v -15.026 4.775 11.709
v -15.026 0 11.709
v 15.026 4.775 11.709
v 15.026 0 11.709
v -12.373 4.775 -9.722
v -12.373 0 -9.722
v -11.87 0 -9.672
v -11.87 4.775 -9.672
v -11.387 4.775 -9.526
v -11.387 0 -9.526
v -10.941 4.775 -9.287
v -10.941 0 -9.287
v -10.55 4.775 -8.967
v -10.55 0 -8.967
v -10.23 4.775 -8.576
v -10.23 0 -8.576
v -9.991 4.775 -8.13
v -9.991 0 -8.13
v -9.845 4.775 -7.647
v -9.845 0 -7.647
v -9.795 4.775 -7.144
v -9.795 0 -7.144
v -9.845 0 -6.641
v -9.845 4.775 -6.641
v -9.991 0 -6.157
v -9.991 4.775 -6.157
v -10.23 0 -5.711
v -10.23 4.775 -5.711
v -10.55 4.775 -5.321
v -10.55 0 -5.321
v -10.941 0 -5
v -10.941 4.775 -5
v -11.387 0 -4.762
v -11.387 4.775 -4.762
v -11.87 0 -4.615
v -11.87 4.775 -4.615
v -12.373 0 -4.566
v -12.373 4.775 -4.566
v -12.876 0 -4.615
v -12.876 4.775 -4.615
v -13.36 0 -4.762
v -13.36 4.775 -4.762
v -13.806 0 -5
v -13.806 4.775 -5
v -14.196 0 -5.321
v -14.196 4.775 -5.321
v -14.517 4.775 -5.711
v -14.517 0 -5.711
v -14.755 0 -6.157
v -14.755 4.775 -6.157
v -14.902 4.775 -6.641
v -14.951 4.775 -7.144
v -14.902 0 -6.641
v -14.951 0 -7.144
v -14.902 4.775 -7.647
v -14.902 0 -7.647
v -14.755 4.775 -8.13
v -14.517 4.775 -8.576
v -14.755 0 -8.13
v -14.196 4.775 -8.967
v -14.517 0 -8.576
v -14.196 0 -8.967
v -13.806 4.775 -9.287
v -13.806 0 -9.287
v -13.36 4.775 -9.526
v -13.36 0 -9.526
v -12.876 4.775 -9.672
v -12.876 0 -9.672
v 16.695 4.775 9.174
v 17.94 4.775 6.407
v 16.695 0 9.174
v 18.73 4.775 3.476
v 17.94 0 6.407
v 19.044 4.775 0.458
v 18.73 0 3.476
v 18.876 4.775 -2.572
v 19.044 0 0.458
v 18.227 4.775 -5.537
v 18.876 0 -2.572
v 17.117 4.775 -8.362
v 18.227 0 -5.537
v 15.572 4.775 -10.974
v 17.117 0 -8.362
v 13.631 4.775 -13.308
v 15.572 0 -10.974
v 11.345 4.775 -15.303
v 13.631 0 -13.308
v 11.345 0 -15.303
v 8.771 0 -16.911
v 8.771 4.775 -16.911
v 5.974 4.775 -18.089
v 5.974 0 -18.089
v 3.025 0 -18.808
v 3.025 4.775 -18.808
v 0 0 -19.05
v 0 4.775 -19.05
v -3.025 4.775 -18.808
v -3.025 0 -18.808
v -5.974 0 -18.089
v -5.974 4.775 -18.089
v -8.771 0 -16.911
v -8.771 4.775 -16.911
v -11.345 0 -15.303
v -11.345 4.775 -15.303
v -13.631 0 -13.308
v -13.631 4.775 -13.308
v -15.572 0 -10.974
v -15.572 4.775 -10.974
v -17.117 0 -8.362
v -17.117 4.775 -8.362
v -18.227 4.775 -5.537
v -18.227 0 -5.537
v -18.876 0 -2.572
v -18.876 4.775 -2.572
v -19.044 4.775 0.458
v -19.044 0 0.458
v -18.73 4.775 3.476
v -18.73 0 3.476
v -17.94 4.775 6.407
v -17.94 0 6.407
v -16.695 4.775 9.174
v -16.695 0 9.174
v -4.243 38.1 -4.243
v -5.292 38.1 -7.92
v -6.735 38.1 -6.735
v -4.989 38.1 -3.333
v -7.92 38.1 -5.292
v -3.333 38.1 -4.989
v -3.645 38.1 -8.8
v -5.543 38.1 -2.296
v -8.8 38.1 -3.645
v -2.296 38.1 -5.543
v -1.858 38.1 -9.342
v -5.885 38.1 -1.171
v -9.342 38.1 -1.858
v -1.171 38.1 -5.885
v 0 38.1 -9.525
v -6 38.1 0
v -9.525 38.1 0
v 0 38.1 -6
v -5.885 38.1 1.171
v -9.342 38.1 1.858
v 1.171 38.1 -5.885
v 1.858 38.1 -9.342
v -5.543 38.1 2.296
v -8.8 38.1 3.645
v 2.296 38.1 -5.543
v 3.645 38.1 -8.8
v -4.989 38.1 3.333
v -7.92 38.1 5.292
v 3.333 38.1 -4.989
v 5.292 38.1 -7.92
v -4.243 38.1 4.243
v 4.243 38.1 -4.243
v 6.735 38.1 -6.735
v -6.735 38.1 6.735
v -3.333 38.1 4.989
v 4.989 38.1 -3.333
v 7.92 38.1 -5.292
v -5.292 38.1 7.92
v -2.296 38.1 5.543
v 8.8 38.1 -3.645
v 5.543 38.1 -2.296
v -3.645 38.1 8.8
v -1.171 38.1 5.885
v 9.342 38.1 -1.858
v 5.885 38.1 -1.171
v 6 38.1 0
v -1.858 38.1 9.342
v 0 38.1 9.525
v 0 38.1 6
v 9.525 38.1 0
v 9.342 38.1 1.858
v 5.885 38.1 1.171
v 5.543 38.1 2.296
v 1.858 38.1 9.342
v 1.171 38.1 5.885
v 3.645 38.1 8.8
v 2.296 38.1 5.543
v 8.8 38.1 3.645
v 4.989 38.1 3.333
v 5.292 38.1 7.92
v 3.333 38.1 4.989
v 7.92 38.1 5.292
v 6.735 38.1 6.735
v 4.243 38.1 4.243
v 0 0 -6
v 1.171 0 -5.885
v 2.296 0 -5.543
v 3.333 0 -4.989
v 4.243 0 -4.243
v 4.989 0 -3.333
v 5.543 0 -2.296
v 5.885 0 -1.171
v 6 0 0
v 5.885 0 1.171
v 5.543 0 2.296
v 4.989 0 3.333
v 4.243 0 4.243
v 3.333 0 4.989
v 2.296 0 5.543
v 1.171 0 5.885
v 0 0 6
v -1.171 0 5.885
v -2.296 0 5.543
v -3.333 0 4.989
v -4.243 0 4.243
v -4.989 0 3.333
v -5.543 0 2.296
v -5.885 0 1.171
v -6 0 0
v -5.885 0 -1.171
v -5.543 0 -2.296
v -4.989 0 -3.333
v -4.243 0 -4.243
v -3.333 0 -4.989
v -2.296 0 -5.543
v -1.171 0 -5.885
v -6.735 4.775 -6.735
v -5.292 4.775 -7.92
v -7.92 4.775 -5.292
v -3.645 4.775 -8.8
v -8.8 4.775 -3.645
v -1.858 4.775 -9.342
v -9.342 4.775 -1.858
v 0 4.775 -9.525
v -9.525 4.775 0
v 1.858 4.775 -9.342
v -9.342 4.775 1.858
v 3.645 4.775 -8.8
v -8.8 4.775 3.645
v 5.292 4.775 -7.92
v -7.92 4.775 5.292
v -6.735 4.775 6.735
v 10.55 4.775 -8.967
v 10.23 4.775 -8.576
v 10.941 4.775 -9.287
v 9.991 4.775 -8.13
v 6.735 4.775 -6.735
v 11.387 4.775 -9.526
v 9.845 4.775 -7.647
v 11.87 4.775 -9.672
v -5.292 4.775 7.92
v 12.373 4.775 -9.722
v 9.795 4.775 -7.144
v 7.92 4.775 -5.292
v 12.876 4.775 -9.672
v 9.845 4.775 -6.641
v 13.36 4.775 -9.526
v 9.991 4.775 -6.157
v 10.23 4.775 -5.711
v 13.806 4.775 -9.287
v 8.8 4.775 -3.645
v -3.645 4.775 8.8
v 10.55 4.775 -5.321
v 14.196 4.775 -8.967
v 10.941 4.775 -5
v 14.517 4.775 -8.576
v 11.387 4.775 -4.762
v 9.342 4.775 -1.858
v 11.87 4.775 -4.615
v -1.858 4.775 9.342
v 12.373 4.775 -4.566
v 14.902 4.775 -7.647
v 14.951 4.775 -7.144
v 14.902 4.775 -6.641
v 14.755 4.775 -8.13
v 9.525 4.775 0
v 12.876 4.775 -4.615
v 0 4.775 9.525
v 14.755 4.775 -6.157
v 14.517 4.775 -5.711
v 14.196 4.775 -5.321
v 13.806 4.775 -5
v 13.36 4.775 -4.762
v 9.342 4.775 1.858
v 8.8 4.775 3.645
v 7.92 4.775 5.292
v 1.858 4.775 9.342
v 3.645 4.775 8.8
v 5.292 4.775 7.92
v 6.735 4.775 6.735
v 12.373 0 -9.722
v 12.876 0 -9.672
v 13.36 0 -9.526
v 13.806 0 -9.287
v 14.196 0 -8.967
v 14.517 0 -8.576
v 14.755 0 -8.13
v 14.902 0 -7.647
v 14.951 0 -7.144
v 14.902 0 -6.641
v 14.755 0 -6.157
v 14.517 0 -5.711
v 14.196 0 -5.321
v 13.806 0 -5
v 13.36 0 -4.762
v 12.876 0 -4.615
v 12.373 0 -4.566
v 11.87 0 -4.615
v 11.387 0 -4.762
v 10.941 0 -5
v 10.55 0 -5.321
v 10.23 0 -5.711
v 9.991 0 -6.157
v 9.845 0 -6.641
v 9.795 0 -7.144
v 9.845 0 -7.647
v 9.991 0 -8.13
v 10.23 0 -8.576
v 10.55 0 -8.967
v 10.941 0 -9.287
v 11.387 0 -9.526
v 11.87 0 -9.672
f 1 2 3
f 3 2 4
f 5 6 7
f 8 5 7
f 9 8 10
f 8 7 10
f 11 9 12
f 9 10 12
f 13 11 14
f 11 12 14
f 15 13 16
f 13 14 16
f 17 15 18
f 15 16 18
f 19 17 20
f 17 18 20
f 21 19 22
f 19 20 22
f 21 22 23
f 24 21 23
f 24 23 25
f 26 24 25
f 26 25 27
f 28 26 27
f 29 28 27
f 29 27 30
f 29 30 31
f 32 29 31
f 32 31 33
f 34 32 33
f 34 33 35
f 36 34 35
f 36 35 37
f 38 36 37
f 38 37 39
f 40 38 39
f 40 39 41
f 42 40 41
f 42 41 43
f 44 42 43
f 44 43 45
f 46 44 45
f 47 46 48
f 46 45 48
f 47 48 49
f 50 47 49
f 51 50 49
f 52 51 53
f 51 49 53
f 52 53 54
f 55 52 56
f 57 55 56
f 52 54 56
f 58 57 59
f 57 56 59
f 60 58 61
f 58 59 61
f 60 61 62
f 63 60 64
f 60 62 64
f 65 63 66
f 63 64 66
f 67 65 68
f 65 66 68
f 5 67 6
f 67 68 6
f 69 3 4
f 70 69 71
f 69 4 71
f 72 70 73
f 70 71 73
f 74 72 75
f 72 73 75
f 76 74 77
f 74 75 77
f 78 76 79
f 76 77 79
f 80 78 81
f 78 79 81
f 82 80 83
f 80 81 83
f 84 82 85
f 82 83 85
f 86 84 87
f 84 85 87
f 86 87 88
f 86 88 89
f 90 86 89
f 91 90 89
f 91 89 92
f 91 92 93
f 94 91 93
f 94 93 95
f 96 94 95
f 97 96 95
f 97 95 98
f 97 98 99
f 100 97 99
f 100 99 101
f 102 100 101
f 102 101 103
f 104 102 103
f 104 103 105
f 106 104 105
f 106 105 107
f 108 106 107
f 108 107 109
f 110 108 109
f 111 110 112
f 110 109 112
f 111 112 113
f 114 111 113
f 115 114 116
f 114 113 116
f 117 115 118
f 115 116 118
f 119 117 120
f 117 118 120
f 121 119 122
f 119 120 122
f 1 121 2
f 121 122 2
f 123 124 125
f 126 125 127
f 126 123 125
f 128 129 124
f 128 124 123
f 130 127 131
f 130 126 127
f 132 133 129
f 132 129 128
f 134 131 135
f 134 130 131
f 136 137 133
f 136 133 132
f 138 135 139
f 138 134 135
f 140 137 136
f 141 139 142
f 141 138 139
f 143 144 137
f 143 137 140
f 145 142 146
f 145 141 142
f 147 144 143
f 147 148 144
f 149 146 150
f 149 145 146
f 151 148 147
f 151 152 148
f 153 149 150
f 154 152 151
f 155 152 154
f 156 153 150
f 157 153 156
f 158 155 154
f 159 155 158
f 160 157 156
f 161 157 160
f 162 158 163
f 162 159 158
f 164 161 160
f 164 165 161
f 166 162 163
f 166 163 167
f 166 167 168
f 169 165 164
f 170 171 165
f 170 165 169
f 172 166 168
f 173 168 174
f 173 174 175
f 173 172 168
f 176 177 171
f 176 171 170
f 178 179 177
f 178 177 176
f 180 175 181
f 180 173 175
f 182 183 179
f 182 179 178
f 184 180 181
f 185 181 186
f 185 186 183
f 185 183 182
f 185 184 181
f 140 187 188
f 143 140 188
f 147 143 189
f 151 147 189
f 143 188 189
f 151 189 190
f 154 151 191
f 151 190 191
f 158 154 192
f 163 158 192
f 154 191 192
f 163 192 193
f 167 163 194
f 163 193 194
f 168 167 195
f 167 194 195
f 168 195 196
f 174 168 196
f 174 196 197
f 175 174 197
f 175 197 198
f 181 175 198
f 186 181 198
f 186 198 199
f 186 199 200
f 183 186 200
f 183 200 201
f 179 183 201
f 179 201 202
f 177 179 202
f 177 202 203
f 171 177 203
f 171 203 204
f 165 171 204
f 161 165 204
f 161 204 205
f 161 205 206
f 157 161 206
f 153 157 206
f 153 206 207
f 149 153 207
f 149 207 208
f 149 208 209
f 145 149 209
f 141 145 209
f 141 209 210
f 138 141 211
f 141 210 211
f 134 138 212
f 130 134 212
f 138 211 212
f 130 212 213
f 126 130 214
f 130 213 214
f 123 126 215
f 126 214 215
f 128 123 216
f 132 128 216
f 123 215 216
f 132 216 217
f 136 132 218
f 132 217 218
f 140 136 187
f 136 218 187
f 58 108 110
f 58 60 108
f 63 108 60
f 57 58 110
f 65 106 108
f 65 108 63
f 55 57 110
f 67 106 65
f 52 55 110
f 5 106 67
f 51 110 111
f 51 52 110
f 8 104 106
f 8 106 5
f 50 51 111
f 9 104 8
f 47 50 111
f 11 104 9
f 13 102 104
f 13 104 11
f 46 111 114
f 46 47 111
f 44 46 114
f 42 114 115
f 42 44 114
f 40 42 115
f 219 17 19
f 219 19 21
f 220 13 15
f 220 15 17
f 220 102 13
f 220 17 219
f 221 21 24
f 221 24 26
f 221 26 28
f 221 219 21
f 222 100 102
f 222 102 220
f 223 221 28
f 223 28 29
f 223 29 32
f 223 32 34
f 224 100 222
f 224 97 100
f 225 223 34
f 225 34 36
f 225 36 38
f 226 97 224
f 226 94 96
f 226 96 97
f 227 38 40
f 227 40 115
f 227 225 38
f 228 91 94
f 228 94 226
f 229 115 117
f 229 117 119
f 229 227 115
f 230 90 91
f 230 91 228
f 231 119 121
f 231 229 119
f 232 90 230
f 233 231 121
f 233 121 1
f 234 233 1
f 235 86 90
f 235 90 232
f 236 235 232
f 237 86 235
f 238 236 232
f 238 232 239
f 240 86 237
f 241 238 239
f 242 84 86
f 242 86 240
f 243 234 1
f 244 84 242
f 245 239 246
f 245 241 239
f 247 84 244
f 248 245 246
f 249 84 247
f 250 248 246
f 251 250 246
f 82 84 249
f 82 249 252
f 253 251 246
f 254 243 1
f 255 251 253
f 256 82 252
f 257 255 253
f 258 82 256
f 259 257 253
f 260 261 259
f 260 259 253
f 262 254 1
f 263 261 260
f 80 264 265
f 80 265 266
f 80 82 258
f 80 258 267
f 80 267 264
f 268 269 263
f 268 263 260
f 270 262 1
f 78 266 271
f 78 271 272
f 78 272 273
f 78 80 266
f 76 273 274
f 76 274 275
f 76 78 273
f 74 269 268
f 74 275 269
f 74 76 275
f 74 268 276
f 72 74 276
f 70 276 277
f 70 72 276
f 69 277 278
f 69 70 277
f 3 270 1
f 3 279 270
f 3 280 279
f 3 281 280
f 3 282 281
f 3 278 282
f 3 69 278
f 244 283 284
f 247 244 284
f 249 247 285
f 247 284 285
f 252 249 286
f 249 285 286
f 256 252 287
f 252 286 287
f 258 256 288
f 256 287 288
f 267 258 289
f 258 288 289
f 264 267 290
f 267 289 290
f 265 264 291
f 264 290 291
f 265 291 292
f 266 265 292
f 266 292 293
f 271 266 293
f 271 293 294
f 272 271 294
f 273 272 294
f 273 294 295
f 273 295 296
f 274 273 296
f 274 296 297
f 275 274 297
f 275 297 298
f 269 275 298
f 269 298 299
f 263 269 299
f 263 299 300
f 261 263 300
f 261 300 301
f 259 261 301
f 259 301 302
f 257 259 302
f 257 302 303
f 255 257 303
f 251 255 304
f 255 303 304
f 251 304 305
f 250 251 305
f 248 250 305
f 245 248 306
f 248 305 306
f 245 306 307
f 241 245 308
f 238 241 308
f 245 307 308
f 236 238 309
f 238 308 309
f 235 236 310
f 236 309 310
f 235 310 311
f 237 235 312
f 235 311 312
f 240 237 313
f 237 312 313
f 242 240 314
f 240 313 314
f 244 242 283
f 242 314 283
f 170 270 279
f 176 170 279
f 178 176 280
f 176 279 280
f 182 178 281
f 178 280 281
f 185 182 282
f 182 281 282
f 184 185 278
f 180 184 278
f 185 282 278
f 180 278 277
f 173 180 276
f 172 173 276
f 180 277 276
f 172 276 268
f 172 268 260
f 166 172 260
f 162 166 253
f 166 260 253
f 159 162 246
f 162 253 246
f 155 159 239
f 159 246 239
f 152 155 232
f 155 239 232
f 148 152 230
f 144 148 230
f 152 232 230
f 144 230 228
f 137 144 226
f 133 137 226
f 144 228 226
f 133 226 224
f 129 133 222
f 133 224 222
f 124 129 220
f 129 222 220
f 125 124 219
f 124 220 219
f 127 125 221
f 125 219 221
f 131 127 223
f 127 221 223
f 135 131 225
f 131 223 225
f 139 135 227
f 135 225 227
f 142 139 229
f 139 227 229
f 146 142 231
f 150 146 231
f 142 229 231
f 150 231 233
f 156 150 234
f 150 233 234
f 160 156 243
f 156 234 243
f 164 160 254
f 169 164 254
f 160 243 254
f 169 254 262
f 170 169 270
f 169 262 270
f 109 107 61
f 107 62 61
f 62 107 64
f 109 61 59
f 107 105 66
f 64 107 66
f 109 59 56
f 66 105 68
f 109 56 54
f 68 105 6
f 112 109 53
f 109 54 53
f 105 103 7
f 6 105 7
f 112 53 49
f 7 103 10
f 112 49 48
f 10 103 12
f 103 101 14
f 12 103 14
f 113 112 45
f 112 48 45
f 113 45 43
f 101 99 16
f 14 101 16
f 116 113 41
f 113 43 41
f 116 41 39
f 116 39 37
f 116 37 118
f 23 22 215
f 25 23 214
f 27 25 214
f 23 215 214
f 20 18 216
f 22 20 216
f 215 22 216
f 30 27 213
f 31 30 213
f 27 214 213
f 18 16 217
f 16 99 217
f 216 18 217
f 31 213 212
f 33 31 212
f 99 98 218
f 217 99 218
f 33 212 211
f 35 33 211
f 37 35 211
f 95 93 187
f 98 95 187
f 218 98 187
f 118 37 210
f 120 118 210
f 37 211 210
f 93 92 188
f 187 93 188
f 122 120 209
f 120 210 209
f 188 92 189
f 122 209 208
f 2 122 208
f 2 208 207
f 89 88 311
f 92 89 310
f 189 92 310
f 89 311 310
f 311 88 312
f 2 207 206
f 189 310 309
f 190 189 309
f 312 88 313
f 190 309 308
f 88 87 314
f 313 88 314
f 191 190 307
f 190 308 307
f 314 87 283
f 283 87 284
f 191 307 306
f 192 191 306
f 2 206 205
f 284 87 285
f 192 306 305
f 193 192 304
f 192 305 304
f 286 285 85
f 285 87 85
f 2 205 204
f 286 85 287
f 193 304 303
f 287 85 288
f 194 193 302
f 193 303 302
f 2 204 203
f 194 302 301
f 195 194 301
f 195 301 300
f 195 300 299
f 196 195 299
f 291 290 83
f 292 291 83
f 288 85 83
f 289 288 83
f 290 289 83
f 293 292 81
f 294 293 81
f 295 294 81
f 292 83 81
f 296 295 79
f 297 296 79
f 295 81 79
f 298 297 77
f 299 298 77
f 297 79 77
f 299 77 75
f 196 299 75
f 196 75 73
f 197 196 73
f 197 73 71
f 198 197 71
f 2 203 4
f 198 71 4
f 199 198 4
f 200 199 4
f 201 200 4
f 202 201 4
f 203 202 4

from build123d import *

# Parameters (mm, degrees)
SKETCH1_R           = 19.05
BOSS_EXTRUDE1_DEPTH = 4.7752
SKETCH2_R           = 9.525
BOSS_EXTRUDE2_DEPTH = 33.3248
CUT_EXTRUDE1_REACH  = 48.663
SKETCH3_R           = 2.5781
CUT_EXTRUDE2_REACH  = 48.663
SKETCH4_R           = 6
CUT_EXTRUDE3_REACH  = 48.663


with BuildPart() as part:
    # Sketch1 → Boss-Extrude1 (new body)
    with BuildSketch(Plane(origin=(0, 0, 0), x_dir=(1, 0, 0), z_dir=(0, 1, 0))):
        with Locations(Location((0, 0, 0), (0, 0, 270))):
            Circle(SKETCH1_R)
    extrude(amount=BOSS_EXTRUDE1_DEPTH)

    # Sketch2 → Boss-Extrude2 (add)
    with BuildSketch(Plane(origin=(0, 4.7752, 0), x_dir=(1, 0, 0), z_dir=(0, 1, 0))):
        with Locations(Location((0, 0, 0), (0, 0, 270))):
            Circle(SKETCH2_R)
    extrude(amount=BOSS_EXTRUDE2_DEPTH)

    # Sketch3 → Cut-Extrude1 (cut, up to next)
    with BuildSketch(Plane.XZ, mode=Mode.PRIVATE) as cut_extrude1_sk1:
        with Locations(Location((0, 14.2875, 0), (0, 0, 270))):
            Circle(SKETCH3_R)
    cut_extrude1_tool1 = extrude(cut_extrude1_sk1.sketch, amount=-CUT_EXTRUDE1_REACH, mode=Mode.PRIVATE) & part.part
    # Sketch3 → Cut-Extrude1 (cut, up to next)
    with BuildSketch(Plane.XZ, mode=Mode.PRIVATE) as cut_extrude1_sk2:
        with Locations(Location((-12.373337957, -7.14375, 0), (0, 0, 270))):
            Circle(SKETCH3_R)
    cut_extrude1_tool2 = extrude(cut_extrude1_sk2.sketch, amount=-CUT_EXTRUDE1_REACH, mode=Mode.PRIVATE) & part.part
    # Sketch3 → Cut-Extrude1 (cut, up to next)
    with BuildSketch(Plane.XZ, mode=Mode.PRIVATE) as cut_extrude1_sk3:
        with Locations(Location((12.373337957, -7.14375, 0), (0, 0, 270))):
            Circle(SKETCH3_R)
    cut_extrude1_tool3 = extrude(cut_extrude1_sk3.sketch, amount=-CUT_EXTRUDE1_REACH, mode=Mode.PRIVATE) & part.part
    add(cut_extrude1_tool1.solids().sort_by_distance((0, 0, 14.2875))[0], mode=Mode.SUBTRACT)
    add(cut_extrude1_tool2.solids().sort_by_distance((-12.373338, 0, -7.14375))[0], mode=Mode.SUBTRACT)
    add(cut_extrude1_tool3.solids().sort_by_distance((12.373338, 0, -7.14375))[0], mode=Mode.SUBTRACT)

    # Sketch4 → Cut-Extrude2 (cut, up to next)
    with BuildSketch(Plane.XZ, mode=Mode.PRIVATE) as cut_extrude2_sk1:
        with Locations(Location((0, 0, 0), (0, 0, 270))):
            Circle(SKETCH4_R)
    cut_extrude2_tool1 = extrude(cut_extrude2_sk1.sketch, amount=-CUT_EXTRUDE2_REACH, mode=Mode.PRIVATE) & part.part
    add(cut_extrude2_tool1.solids().sort_by_distance((0, 0, 0))[0], mode=Mode.SUBTRACT)

    # Sketch5 → Cut-Extrude3 (cut, up to next)
    with BuildSketch(Plane(origin=(0, 0, 0), x_dir=(-1, 0, 0), z_dir=(0, -1, 0)), mode=Mode.PRIVATE) as cut_extrude3_sk1:
        with BuildLine():
            Line((15.026391837, -11.7094), (-15.026391837, -11.7094))
            ThreePointArc((-15.026391837, -11.7094), (0, -19.05), (15.026391837, -11.7094))
        make_face()
    cut_extrude3_tool1 = extrude(cut_extrude3_sk1.sketch, amount=-CUT_EXTRUDE3_REACH, mode=Mode.PRIVATE) & part.part
    add(cut_extrude3_tool1.solids().sort_by_distance((0, 0, 14.700269))[0], mode=Mode.SUBTRACT)


solid = part.part
